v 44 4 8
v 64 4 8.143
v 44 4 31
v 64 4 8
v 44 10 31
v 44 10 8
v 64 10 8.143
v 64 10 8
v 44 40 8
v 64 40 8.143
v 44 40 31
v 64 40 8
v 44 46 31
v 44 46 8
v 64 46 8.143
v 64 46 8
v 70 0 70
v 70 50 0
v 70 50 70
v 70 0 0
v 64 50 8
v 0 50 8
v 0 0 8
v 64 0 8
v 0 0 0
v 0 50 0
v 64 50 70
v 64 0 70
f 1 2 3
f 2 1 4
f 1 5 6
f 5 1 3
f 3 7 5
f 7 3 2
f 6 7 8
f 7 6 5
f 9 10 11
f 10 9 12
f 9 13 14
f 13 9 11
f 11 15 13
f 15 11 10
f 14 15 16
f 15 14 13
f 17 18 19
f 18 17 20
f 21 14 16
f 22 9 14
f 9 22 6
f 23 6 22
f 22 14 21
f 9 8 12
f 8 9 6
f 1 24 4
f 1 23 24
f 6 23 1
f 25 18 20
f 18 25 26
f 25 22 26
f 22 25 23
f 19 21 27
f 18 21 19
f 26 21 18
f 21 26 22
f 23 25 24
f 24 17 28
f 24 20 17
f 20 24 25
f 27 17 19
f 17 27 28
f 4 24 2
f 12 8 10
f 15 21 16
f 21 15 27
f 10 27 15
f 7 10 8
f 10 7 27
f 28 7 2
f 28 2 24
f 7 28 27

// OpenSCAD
$fn = 32;

// ----------------------------------------------------------------------
// Rib bracket: 2-gusset L bracket
// ----------------------------------------------------------------------

// --- parameters (mm) ---
base_l = 70;              // foot length, X
base_w = 50;              // foot width, Y
base_t = 8;               // foot thickness
plate_t = 6;              // upright plate thickness
plate_h = 70;             // overall height
gus_l = 20;               // gusset leg along the foot
gus_h = 24;               // gusset height
gus_t = 6;                // gusset thickness
gus_edge = 4;             // gusset margin from the foot edge
n_gus = 2;                // gusset count

gus_pitch = (base_w - 2 * gus_edge - gus_t) / (n_gus - 1);  // gusset pitch

union() {
  cube([base_l, base_w, base_t]);
  translate([base_l - plate_t, 0, base_t - 1])
    cube([plate_t, base_w, plate_h - base_t + 1]);
  for (i = [0 : n_gus - 1])
    translate([base_l - plate_t - gus_l, gus_edge + i * gus_pitch, base_t - 1])
      rotate([-90, 0, 0])
        linear_extrude(height = gus_t)
          polygon(points = [[0, 0], [gus_l + 1, 0], [0, -gus_h]]);
}
